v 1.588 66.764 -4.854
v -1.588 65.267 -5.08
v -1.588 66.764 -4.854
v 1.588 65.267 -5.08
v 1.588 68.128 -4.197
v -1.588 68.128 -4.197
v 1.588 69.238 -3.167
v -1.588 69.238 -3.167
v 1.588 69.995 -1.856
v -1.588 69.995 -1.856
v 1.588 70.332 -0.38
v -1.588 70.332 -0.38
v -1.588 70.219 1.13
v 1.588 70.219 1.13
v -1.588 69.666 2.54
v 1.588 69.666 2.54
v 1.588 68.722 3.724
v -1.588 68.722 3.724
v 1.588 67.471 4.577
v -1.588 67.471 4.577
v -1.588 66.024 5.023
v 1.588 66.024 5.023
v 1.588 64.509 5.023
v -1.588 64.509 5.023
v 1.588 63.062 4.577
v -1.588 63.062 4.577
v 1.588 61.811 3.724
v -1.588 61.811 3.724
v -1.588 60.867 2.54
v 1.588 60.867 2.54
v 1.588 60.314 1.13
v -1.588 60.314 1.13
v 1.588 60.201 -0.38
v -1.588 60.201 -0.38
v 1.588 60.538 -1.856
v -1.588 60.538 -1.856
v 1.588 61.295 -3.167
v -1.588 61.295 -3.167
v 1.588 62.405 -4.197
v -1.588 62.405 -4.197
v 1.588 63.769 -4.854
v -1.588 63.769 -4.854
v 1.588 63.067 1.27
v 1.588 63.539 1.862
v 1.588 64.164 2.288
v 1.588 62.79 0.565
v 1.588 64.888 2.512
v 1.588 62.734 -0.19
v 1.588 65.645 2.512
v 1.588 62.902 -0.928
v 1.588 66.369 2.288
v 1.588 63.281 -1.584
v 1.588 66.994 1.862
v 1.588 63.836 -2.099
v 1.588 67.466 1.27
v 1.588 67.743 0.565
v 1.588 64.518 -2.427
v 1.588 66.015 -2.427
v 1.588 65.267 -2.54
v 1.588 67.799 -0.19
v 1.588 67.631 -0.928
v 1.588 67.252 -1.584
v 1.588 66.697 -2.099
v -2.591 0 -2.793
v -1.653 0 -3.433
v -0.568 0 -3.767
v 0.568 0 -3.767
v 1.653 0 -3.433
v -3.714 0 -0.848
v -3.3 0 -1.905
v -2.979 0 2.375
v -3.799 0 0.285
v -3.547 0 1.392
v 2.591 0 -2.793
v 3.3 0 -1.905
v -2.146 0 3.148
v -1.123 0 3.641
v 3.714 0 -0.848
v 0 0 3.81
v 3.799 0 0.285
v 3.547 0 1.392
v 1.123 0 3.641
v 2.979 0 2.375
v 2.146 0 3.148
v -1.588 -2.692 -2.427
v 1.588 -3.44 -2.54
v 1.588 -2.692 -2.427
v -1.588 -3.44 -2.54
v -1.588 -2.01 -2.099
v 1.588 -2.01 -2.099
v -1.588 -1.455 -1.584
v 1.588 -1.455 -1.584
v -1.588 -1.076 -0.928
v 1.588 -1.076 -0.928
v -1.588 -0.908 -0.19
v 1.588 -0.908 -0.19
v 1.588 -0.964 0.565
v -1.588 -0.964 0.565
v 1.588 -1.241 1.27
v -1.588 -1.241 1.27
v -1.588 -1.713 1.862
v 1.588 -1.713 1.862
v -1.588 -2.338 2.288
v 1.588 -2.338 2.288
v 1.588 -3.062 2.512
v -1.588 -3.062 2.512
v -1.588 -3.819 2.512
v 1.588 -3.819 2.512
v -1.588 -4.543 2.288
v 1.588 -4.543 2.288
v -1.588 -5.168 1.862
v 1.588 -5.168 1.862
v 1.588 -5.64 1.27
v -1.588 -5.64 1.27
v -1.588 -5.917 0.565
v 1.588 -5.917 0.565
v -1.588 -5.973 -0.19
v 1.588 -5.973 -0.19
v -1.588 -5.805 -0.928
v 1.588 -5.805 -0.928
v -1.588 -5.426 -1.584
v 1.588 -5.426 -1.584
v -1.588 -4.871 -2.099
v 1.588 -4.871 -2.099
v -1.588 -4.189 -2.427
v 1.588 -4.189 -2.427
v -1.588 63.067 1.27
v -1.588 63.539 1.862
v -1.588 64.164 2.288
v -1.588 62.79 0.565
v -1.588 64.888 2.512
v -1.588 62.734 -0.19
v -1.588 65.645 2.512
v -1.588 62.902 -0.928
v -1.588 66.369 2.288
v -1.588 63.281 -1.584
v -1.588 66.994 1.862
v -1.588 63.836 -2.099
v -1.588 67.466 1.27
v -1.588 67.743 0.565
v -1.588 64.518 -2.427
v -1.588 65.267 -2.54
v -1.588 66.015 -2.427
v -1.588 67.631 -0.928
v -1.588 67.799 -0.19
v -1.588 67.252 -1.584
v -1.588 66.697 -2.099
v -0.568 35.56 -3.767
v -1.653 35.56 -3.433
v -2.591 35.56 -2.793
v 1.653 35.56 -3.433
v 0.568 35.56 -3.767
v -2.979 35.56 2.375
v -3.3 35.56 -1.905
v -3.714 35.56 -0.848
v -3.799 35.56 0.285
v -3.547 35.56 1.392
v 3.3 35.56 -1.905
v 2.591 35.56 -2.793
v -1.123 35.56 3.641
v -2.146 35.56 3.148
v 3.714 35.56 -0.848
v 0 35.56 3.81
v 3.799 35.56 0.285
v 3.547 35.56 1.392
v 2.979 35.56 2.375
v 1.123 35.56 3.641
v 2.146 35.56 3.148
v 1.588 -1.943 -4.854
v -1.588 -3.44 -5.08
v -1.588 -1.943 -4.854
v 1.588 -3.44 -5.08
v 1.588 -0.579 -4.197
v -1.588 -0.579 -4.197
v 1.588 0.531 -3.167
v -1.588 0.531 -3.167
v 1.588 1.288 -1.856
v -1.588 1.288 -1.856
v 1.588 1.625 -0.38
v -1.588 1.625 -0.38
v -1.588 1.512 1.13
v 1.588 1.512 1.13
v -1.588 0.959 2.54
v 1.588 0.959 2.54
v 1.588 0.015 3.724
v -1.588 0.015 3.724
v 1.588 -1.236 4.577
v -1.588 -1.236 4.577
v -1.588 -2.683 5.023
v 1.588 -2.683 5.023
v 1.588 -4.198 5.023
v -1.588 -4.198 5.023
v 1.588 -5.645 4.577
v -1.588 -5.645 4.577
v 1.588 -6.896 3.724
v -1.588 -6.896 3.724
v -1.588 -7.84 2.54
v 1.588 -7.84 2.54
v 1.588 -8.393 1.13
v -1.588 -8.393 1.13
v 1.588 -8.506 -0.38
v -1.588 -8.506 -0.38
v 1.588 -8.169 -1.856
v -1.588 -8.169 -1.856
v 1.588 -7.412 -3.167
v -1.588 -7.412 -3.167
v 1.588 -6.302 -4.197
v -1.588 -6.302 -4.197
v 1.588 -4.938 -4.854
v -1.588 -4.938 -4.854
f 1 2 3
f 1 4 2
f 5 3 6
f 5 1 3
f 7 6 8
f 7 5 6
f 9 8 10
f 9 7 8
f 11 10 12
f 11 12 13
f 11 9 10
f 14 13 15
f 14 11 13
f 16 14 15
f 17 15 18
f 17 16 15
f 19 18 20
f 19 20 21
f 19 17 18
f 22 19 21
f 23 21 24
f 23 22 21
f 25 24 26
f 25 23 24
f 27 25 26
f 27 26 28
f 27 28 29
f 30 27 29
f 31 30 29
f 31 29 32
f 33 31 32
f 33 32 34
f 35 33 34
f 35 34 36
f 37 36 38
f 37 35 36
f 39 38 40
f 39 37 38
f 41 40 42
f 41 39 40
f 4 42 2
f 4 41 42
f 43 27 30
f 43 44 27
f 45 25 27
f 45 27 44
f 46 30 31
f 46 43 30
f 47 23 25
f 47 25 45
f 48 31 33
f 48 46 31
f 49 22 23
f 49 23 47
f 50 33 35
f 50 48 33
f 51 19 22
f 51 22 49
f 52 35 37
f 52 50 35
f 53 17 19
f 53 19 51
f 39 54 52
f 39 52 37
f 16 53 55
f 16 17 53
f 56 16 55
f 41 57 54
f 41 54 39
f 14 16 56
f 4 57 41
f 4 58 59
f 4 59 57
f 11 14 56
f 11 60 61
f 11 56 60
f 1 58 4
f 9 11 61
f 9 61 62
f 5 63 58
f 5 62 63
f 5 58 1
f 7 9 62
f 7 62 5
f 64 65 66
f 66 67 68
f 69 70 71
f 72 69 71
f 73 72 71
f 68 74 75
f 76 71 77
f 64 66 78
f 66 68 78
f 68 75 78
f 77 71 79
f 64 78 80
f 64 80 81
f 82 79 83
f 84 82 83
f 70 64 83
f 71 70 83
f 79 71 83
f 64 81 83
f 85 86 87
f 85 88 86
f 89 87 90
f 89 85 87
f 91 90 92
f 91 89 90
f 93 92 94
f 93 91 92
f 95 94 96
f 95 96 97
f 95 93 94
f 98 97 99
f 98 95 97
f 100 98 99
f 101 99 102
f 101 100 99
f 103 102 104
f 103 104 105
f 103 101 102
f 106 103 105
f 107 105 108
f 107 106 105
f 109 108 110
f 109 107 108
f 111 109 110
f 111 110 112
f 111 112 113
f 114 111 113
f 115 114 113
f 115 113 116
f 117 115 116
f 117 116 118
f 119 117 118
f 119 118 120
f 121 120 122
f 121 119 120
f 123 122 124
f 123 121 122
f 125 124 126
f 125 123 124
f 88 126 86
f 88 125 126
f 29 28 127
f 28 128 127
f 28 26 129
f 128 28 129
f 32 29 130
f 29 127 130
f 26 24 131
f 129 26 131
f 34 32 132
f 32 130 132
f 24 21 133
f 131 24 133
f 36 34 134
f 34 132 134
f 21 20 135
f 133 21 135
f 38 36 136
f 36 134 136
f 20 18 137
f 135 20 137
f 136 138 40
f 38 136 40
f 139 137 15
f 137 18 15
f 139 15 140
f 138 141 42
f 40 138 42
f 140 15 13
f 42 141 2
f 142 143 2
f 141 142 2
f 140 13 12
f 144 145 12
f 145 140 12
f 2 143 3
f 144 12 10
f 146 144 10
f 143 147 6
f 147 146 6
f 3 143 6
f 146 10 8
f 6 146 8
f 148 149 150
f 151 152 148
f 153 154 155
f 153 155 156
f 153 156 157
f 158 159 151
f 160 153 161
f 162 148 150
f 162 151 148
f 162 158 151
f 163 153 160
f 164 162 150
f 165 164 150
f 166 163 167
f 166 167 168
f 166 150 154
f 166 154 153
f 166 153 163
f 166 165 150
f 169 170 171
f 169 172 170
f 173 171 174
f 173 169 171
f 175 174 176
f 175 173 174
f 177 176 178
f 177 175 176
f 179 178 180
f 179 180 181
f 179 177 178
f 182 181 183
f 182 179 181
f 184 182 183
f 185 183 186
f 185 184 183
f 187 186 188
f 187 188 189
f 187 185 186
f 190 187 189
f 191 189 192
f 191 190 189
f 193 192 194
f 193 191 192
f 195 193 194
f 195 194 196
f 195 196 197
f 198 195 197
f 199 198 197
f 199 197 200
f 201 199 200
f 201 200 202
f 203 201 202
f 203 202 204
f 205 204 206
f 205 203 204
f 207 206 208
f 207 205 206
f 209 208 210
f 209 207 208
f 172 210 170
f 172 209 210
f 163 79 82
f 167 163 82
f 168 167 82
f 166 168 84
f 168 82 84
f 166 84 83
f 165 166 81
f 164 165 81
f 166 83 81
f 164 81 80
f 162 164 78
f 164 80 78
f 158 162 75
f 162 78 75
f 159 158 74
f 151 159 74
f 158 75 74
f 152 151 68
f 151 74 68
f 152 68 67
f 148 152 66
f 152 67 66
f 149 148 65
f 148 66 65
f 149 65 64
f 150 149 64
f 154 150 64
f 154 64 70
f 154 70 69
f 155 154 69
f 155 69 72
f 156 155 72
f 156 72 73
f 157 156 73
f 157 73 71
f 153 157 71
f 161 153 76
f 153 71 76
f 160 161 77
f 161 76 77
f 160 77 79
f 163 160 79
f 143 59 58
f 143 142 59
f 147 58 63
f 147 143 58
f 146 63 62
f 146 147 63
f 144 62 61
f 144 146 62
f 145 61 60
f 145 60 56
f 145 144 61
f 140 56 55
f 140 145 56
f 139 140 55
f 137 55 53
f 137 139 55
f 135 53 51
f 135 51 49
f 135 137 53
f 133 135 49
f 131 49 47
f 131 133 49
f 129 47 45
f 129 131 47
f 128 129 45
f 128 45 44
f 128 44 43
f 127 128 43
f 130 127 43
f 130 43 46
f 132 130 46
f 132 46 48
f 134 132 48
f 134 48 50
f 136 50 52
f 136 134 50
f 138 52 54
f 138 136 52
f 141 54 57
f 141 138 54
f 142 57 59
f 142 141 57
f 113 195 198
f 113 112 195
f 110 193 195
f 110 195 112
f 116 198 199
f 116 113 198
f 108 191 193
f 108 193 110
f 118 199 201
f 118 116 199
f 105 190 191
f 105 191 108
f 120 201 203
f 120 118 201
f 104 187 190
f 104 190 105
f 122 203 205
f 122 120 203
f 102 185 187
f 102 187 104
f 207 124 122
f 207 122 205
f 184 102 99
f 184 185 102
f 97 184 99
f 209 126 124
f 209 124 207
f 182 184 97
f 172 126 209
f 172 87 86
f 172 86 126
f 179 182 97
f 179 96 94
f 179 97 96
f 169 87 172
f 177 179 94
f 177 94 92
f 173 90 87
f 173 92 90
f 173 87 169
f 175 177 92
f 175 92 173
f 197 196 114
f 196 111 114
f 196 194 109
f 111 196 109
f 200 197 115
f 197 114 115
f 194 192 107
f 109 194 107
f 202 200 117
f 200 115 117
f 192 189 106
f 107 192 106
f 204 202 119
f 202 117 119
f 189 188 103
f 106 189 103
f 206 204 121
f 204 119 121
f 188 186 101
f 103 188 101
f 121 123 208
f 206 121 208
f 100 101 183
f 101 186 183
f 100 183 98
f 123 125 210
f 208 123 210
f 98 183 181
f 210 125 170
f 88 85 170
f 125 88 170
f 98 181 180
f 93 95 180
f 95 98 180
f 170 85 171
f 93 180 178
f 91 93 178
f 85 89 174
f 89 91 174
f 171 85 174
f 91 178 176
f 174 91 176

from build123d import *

# Parameters (mm, degrees)
SKETCH1_R             = 3.81
EXTRUDE1_DEPTH        = 35.56
SKETCH4_R             = 5.08
SKETCH4_R_2           = 2.54
EXTRUDE_THIN1_DEPTH   = 1.5875
EXTRUDE_THIN1_2_DEPTH = 1.5875


with BuildPart() as part:
    # Sketch1 → Extrude1 (new body)
    with BuildSketch(Plane(origin=(0, 0, 0), x_dir=(1, 0, 0), z_dir=(0, 1, 0))):
        with Locations(Location((0, 0, 0), (0, 0, 270))):
            Circle(SKETCH1_R)
    extrude(amount=EXTRUDE1_DEPTH)


with BuildPart() as body_2:
    # Sketch4 → Extrude-Thin1 (new, symmetric)
    with BuildSketch(Plane(origin=(0, 0, 0), x_dir=(0, 0, -1), z_dir=(1, 0, 0))):
        with Locations((0, 65.2665448)):
            Circle(SKETCH4_R)
        with Locations((0, 65.2665448)):
            Circle(SKETCH4_R_2, mode=Mode.SUBTRACT)
    extrude(amount=EXTRUDE_THIN1_DEPTH, both=True)


with BuildPart() as body_3:
    # Sketch4 → Extrude-Thin1 2 (new, symmetric)
    with BuildSketch(Plane(origin=(0, 0, 0), x_dir=(0, 0, -1), z_dir=(1, 0, 0))):
        with Locations((0, -3.4404552)):
            Circle(SKETCH4_R)
        with Locations((0, -3.4404552)):
            Circle(SKETCH4_R_2, mode=Mode.SUBTRACT)
    extrude(amount=EXTRUDE_THIN1_2_DEPTH, both=True)


solid = Compound([part.part, body_2.part, body_3.part])
